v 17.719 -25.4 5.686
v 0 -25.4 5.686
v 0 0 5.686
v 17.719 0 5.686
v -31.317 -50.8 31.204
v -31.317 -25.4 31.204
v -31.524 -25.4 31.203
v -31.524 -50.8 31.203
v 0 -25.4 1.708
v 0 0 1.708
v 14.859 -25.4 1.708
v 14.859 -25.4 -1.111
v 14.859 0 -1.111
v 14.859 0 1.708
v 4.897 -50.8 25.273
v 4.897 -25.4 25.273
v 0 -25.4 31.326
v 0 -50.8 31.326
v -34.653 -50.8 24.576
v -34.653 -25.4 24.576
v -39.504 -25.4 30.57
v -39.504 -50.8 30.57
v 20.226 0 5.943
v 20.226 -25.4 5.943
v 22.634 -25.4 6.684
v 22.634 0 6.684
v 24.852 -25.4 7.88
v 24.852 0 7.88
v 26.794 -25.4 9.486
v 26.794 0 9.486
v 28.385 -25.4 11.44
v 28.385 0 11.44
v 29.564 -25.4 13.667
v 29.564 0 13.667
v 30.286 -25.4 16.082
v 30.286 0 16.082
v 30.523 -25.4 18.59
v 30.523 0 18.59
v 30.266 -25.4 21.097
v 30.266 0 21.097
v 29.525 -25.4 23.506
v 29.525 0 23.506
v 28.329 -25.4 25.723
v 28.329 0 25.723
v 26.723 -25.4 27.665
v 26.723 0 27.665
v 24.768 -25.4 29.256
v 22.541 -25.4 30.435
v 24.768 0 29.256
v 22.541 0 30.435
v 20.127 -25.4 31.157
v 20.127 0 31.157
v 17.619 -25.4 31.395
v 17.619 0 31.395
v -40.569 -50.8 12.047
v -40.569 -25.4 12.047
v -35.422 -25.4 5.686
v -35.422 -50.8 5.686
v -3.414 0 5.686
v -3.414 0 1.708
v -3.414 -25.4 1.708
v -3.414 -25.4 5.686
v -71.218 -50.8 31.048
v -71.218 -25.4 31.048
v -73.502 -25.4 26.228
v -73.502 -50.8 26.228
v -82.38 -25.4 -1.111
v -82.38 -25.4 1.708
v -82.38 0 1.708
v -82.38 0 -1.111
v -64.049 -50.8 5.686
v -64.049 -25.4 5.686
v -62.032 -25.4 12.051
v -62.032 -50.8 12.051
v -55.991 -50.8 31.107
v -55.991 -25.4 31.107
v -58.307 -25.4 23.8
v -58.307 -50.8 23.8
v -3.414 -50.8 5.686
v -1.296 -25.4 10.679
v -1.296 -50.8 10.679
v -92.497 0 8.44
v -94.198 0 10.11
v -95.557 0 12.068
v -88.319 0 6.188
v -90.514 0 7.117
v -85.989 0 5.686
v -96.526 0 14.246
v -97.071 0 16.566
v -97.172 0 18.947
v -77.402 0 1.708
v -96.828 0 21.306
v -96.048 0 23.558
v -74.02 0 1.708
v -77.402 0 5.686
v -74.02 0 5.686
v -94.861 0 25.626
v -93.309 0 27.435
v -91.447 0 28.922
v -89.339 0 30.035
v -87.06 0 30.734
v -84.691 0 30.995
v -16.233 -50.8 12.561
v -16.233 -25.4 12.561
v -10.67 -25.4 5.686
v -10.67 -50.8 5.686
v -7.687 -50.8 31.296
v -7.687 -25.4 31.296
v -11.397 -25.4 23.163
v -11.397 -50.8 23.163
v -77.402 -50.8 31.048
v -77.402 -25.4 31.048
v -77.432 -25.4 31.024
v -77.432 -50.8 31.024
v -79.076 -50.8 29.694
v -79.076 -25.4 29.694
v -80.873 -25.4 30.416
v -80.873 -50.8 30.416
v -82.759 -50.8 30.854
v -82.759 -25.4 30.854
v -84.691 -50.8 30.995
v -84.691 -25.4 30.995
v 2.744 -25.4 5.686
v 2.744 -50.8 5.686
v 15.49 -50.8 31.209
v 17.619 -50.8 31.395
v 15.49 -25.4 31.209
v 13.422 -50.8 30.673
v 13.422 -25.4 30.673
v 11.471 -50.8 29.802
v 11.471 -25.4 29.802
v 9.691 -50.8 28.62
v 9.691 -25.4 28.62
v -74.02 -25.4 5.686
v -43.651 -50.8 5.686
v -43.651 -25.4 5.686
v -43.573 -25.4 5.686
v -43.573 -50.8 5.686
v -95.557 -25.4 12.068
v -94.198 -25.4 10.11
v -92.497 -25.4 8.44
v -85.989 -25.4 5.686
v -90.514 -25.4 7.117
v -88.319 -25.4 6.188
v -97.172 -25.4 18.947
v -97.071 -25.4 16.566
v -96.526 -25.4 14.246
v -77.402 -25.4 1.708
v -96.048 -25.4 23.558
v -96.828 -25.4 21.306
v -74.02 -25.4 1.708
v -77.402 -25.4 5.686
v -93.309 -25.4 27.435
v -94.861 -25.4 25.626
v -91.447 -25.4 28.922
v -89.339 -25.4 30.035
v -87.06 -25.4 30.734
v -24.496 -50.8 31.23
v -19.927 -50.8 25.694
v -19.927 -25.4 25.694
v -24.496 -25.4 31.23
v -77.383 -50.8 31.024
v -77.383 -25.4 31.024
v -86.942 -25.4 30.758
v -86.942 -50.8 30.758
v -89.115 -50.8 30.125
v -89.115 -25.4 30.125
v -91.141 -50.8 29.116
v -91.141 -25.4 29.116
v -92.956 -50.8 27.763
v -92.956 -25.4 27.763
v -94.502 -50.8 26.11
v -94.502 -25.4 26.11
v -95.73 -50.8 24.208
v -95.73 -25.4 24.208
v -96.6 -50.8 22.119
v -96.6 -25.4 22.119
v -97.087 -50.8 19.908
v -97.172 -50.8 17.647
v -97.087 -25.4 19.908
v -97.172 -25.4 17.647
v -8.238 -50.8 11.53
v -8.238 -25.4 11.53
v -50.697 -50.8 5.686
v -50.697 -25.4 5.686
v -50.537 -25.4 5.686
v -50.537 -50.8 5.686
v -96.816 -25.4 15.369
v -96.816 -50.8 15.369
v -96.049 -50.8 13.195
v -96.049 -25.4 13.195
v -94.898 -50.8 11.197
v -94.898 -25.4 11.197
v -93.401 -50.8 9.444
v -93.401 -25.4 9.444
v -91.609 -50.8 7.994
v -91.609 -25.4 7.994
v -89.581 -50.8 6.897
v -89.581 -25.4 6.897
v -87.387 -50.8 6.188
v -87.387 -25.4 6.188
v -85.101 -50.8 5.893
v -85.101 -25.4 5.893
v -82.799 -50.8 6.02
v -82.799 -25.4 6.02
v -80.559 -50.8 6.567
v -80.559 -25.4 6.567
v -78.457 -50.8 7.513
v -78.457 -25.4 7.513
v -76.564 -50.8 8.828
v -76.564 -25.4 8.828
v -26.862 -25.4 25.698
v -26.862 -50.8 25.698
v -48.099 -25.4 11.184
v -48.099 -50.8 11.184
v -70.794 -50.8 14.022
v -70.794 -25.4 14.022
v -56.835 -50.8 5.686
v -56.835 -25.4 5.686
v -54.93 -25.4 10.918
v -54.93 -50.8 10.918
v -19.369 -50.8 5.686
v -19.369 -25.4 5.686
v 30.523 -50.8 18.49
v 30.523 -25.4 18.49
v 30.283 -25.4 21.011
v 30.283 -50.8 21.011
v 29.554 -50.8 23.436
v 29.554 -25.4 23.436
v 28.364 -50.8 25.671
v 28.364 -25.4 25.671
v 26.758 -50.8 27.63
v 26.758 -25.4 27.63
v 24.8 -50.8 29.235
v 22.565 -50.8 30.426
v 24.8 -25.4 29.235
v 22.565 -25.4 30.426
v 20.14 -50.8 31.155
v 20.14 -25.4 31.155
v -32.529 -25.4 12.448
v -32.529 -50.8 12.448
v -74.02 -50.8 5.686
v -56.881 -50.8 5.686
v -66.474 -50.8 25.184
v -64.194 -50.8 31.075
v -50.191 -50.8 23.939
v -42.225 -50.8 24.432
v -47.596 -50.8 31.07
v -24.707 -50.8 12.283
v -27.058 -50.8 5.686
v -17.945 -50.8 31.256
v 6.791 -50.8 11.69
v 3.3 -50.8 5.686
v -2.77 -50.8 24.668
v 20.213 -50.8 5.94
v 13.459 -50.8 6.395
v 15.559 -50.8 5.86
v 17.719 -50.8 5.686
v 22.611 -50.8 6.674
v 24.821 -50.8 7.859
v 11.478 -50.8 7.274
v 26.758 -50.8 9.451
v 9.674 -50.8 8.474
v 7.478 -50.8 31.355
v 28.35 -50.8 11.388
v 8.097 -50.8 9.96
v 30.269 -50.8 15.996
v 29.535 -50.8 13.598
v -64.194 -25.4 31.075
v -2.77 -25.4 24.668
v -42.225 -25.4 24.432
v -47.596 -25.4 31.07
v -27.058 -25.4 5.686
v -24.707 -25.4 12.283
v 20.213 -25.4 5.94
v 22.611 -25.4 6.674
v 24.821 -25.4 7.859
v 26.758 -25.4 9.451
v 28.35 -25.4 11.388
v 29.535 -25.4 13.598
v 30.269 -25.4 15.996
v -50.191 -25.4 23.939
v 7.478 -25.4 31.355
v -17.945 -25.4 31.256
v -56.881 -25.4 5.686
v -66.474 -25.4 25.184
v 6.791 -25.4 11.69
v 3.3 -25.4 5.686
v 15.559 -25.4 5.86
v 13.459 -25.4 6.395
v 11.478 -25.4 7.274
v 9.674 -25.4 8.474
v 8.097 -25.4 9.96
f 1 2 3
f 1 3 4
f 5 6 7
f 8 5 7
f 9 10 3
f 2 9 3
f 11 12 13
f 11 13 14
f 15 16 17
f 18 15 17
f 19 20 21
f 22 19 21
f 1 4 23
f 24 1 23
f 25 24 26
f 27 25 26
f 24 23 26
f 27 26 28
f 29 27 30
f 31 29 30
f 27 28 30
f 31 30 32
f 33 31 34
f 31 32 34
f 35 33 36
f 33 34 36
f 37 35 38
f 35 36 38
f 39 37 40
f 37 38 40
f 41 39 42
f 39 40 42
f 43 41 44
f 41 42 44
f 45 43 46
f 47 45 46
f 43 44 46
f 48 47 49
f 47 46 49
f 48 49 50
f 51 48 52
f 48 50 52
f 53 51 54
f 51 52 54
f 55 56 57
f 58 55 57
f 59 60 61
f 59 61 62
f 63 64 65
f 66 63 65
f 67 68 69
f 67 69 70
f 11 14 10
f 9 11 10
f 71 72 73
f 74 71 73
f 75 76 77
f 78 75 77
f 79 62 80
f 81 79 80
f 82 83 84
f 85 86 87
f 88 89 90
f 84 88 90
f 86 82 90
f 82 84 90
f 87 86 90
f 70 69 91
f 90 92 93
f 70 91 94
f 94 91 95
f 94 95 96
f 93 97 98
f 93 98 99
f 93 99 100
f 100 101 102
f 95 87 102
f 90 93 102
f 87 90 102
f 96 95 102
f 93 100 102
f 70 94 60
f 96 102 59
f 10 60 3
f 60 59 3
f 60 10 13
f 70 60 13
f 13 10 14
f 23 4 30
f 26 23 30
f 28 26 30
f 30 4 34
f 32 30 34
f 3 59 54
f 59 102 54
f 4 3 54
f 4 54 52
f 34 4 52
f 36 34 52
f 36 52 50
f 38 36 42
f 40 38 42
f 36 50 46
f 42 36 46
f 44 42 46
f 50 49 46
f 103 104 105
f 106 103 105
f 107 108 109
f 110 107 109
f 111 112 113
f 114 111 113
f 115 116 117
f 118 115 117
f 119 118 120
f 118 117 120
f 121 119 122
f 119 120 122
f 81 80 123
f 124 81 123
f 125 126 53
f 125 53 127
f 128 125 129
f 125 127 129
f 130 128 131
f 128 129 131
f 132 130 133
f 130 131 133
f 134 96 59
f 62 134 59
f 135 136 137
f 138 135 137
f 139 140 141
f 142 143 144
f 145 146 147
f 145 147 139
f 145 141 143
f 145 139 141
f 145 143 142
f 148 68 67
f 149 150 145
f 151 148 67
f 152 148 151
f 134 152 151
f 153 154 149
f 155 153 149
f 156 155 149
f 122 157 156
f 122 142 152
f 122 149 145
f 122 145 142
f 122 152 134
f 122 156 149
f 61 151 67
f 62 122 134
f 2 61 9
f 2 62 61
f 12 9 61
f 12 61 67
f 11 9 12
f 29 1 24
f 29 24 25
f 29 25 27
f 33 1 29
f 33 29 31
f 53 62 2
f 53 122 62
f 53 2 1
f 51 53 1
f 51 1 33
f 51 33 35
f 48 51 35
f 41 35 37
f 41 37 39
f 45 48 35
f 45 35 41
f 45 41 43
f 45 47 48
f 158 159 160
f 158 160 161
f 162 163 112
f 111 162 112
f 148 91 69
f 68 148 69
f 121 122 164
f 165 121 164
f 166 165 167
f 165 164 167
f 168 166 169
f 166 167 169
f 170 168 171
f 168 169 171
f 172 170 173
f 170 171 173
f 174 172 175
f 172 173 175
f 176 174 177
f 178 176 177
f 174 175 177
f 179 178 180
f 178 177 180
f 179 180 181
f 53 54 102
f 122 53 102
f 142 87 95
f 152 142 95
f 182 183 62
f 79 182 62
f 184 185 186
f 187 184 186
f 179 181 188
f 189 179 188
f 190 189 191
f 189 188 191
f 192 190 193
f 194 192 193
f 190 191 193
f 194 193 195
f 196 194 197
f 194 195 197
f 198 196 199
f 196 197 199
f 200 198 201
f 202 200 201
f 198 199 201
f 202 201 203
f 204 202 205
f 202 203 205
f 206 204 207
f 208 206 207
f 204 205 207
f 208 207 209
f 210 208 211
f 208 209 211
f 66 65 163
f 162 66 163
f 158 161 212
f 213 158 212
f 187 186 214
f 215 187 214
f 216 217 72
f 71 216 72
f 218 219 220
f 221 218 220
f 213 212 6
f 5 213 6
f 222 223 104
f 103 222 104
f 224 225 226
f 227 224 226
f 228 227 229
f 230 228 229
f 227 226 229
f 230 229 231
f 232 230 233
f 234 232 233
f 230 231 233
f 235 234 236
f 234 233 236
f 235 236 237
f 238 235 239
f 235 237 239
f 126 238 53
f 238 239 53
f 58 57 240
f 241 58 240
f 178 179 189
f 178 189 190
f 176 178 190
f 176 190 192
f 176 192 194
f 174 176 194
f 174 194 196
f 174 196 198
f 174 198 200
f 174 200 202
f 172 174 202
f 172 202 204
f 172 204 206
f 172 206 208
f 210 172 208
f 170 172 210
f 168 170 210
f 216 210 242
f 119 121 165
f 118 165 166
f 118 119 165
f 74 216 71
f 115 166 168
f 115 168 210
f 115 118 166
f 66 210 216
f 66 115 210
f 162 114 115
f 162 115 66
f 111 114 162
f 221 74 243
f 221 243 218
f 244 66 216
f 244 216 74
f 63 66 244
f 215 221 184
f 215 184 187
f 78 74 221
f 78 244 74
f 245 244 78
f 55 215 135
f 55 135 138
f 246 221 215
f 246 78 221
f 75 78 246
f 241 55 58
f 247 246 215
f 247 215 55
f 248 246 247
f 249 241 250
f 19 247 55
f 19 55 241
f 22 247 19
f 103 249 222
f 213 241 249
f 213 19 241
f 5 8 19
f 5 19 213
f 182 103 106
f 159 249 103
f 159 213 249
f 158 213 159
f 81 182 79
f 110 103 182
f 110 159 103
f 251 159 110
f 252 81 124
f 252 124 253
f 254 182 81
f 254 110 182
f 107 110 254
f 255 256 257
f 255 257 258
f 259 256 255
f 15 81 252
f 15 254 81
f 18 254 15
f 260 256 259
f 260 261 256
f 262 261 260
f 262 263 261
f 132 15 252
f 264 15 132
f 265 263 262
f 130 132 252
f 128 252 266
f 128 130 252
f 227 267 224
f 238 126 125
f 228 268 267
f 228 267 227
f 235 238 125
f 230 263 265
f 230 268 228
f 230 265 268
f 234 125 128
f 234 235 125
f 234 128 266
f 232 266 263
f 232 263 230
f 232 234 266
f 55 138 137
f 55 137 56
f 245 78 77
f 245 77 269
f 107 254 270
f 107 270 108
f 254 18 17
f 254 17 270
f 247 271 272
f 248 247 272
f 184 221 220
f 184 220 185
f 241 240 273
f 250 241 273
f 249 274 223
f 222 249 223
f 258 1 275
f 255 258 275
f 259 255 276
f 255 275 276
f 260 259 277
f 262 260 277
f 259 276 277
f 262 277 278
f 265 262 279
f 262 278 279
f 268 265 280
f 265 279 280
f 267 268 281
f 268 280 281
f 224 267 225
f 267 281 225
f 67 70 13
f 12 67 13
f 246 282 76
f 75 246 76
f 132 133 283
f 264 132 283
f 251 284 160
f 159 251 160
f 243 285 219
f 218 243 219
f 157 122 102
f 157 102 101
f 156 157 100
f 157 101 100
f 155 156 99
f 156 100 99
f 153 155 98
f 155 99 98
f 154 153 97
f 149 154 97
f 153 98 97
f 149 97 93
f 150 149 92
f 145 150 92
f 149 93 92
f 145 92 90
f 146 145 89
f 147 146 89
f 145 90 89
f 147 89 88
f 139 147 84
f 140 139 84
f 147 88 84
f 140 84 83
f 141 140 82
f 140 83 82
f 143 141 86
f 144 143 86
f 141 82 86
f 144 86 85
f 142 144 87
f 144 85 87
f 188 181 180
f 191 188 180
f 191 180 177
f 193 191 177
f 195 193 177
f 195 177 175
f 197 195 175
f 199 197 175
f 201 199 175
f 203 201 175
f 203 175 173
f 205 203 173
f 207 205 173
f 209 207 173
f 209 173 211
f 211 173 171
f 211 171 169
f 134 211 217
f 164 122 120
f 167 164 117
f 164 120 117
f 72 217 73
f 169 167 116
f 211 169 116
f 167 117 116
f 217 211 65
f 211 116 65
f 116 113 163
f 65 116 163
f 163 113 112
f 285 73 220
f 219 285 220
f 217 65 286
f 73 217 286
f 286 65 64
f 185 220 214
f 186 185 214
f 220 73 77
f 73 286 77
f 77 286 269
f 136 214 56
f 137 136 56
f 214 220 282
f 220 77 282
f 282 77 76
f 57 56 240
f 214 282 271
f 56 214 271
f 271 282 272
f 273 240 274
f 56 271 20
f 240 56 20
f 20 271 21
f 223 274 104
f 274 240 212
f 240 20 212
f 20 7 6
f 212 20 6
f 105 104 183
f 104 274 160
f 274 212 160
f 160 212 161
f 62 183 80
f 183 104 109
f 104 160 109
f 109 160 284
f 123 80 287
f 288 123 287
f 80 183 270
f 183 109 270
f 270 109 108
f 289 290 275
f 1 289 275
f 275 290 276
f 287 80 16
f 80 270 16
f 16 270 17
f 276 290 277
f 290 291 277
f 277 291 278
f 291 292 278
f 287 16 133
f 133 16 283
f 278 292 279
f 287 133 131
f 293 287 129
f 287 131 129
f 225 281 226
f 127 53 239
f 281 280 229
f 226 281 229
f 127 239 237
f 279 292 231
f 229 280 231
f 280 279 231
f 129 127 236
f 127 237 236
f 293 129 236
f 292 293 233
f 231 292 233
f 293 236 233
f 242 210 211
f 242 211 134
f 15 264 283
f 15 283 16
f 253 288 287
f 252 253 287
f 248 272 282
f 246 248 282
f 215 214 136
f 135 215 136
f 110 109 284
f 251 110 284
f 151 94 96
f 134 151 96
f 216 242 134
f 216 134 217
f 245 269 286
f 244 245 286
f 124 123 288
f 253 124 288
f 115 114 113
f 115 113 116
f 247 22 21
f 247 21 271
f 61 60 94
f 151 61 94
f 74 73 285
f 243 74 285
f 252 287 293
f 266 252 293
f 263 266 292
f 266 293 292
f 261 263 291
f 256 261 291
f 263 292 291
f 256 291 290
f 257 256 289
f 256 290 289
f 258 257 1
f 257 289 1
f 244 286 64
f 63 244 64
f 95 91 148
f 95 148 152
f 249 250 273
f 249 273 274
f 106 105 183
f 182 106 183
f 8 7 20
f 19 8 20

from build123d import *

# Parameters (mm, degrees)
F0_W     = 3.3822506666
F0_H     = 3.9780900193
F0_W_2   = 3.41430353
F1_DEPTH = 25.4
F3_DEPTH = 25.4


with BuildPart() as f1:
    # F0 (on Front) → F1 (new body)
    with BuildSketch(Plane.XZ):
        with BuildLine():
            Line((17.6185293709, 31.3945586435), (-84.690925819, 30.9954284879))
            ThreePointArc((-84.690925819, 30.9954284879), (-97.1724884118, 18.9474547222), (-85.9888429003, 5.6858880844))
            Line((-85.9888429003, 5.6858880844), (-77.4023757015, 5.6858880844))
            Line((-77.4023757015, 5.6858880844), (-74.0201250348, 5.6858880844))
            Line((-74.0201250348, 5.6858880844), (-3.41430353, 5.6858880844))
            Line((-3.41430353, 5.6858880844), (0, 5.6858880844))
            Line((0, 5.6858880844), (17.7188241644, 5.6858880844))
            ThreePointArc((17.7188241644, 5.6858880844), (30.5230120472, 18.5903707607), (17.6185293709, 31.3945586435))
        make_face()
        Polygon((-74.0201250348, 1.7077980651), (-77.4023757015, 1.7077980651), (-82.3802331347, 1.7077980651), (-82.3802331347, -1.1107394616), (14.8593058926, -1.1107394616), (14.8593058926, 1.7077980651), (0, 1.7077980651), (-3.41430353, 1.7077980651), align=None)
        with Locations((-75.7112503681, 3.6968430748)):
            Rectangle(F0_W, F0_H)
        with Locations((-1.707151765, 3.6968430748)):
            Rectangle(F0_W_2, F0_H)
    extrude(amount=F1_DEPTH)


with BuildPart() as f3:
    # F2 (on face) → F3 (new body)
    with BuildSketch(Plane.XZ.offset(25.4)):
        with BuildLine():
            Line((7.4777157191, 31.3549972508), (4.8971420417, 25.2733859425))
            Line((4.8971420417, 25.2733859425), (5.9934429038, 23.9184539713))
            ThreePointArc((5.9934429038, 23.9184539713), (7.5649987966, 26.4870555439), (9.6910032973, 28.6195674022))
            Line((9.6910032973, 28.6195674022), (7.4777157191, 31.3549972508))
        make_face()
        with BuildLine():
            Line((-70.7939430509, 14.0216318164), (-72.3393960707, 15.9316765669))
            ThreePointArc((-72.3393960707, 15.9316765669), (-73.8502646914, 12.0224570054), (-76.5635452821, 8.8282700972))
            Line((-76.5635452821, 8.8282700972), (-74.0201250348, 5.6858880844))
            Line((-74.0201250348, 5.6858880844), (-70.7939430509, 14.0216318164))
        make_face()
        Polygon((-71.2180261518, 31.0479890311), (-73.502197242, 26.227709607), (-68.4746691883, 20.0141246946), (-66.473640178, 25.1843429628), align=None)
        Polygon((-64.1936278631, 31.0753926486), (-66.473640178, 25.1843429628), (-60.2907627098, 17.5428472334), (-58.3071993355, 23.8002818794), align=None)
        Polygon((-66.473640178, 25.1843429628), (-68.4746691883, 20.0141246946), (-62.0316164015, 12.0510750292), (-60.2907627098, 17.5428472334), align=None)
        Polygon((-58.3071993355, 23.8002818794), (-60.2907627098, 17.5428472334), (-54.9303545076, 10.9178515748), (-52.7441106652, 16.9247908908), align=None)
        Polygon((-55.990895741, 31.107393188), (-58.3071993355, 23.8002818794), (-52.7441106652, 16.9247908908), (-50.1911272132, 23.9393865981), align=None)
        Polygon((-50.1911272132, 23.9393865981), (-52.7441106652, 16.9247908908), (-48.0993479846, 11.1842704987), (-45.186380638, 17.7539576005), align=None)
        Polygon((-47.596065493, 31.0695968577), (-50.1911272132, 23.9393865981), (-45.186380638, 17.7539576005), (-42.2254017695, 24.4319262718), align=None)
        Polygon((-42.2254017695, 24.4319262718), (-45.186380638, 17.7539576005), (-40.5691399293, 12.0474519584), (-37.4866464693, 18.5752392237), align=None)
        Polygon((-37.4866464693, 18.5752392237), (-40.5691399293, 12.0474519584), (-35.4218793232, 5.6858880844), (-32.5293636679, 12.4484712987), align=None)
        Polygon((-39.5036414146, 30.5703795293), (-42.2254017695, 24.4319262718), (-37.4866464693, 18.5752392237), (-34.6531887292, 24.5756442832), align=None)
        Polygon((-34.6531887292, 24.5756442832), (-37.4866464693, 18.5752392237), (-32.5293636679, 12.4484712987), (-29.8705353594, 18.6647030608), align=None)
        Polygon((-27.0576307947, 5.6858880844), (-24.7067181319, 12.2826766509), (-29.8705353594, 18.6647030608), (-32.5293636679, 12.4484712987), align=None)
        Polygon((-24.7067181319, 12.2826766509), (-22.0467696405, 19.7466365302), (-26.8621946159, 25.6980805906), (-29.8705353594, 18.6647030608), align=None)
        Polygon((-22.0467696405, 19.7466365302), (-19.9271756152, 25.6943324413), (-24.4959509544, 31.2302614233), (-26.8621946159, 25.6980805906), align=None)
        Polygon((-16.2328725231, 12.5611682395), (-13.6896492255, 18.1363983006), (-19.9271756152, 25.6943324413), (-22.0467696405, 19.7466365302), align=None)
        Polygon((-10.6699544422, 5.6858880844), (-8.2377734431, 11.5304273544), (-13.6896492255, 18.1363983006), (-16.2328725231, 12.5611682395), align=None)
        Polygon((-19.9271756152, 25.6943324413), (-13.6896492255, 18.1363983006), (-11.3968622992, 23.1626241166), (-17.9452165503, 31.2558171809), align=None)
        Polygon((-13.6896492255, 18.1363983006), (-8.2377734431, 11.5304273544), (-6.1141082191, 16.6336021603), (-11.3968622992, 23.1626241166), align=None)
        Polygon((-8.2377734431, 11.5304273544), (-3.41430353, 5.6858880844), (-1.2957857458, 10.678577046), (-6.1141082191, 16.6336021603), align=None)
        Polygon((-11.3968622992, 23.1626241166), (-6.1141082191, 16.6336021603), (-2.7704892434, 24.6683300094), (-7.6867772585, 31.2958374553), align=None)
        Polygon((-2.7704892434, 24.6683300094), (1.9437611458, 18.3131837161), (4.8971420417, 25.2733859425), (0, 31.325825149), align=None)
        Polygon((-68.4746691883, 20.0141246946), (-70.7939430509, 14.0216318164), (-64.049336507, 5.6858880844), (-62.0316164015, 12.0510750292), align=None)
        with BuildLine():
            ThreePointArc((-74.0201250348, 25.134728134), (-72.2906003999, 20.6955873172), (-72.3393960707, 15.9316765669))
            Line((-72.3393960707, 15.9316765669), (-70.7939430509, 14.0216318164))
            Line((-70.7939430509, 14.0216318164), (-68.4746691883, 20.0141246946))
            Line((-68.4746691883, 20.0141246946), (-73.502197242, 26.227709607))
            Line((-73.502197242, 26.227709607), (-74.0201250348, 25.134728134))
        make_face()
        Polygon((-77.4023757015, 31.0479890311), (-77.4323383065, 31.0237457256), (-77.3829159918, 31.0239385322), align=None)
        with BuildLine():
            Line((4.8971420417, 25.2733859425), (1.9437611458, 18.3131837161))
            Line((1.9437611458, 18.3131837161), (6.5135129633, 12.1528318198))
            ThreePointArc((6.5135129633, 12.1528318198), (6.6500466739, 11.9200843098), (6.7914358382, 11.6902540208))
            ThreePointArc((6.7914358382, 11.6902540208), (11.4783947736, 7.2744850804), (17.7188241644, 5.6858880844))
            ThreePointArc((17.7188241644, 5.6858880844), (26.7581335787, 9.4507665529), (30.5230120472, 18.4900759672))
            ThreePointArc((30.5230120472, 18.4900759672), (26.7581335787, 27.629680175), (17.6185293709, 31.3945586435))
            ThreePointArc((17.6185293709, 31.3945586435), (13.4217224395, 30.6728170345), (9.6910032973, 28.6195674022))
            ThreePointArc((9.6910032973, 28.6195674022), (7.5649987966, 26.4870555439), (5.9934429038, 23.9184539713))
            Line((5.9934429038, 23.9184539713), (4.8971420417, 25.2733859425))
        make_face()
        with BuildLine():
            ThreePointArc((-79.0755543994, 29.6941887755), (-76.2329194186, 27.7636351337), (-74.0201250348, 25.134728134))
            Line((-74.0201250348, 25.134728134), (-73.502197242, 26.227709607))
            Line((-73.502197242, 26.227709607), (-77.3829159918, 31.0239385322))
            Line((-77.3829159918, 31.0239385322), (-77.4323383065, 31.0237457256))
            Line((-77.4323383065, 31.0237457256), (-79.0755543994, 29.6941887755))
        make_face()
        with BuildLine():
            ThreePointArc((-76.5635452821, 8.8282700972), (-73.8502646914, 12.0224570054), (-72.3393960707, 15.9316765669))
            ThreePointArc((-72.3393960707, 15.9316765669), (-72.2906003999, 20.6955873172), (-74.0201250348, 25.134728134))
            ThreePointArc((-74.0201250348, 25.134728134), (-76.2329194186, 27.7636351337), (-79.0755543994, 29.6941887755))
            ThreePointArc((-79.0755543994, 29.6941887755), (-81.8075563521, 30.6714144079), (-84.690925819, 30.9954284879))
            ThreePointArc((-84.690925819, 30.9954284879), (-93.7656968448, 26.9708868998), (-97.1724884118, 17.6466080867))
            ThreePointArc((-97.1724884118, 17.6466080867), (-89.5811921329, 6.8965985351), (-76.5635452821, 8.8282700972))
        make_face()
        Polygon((-60.2907627098, 17.5428472334), (-62.0316164015, 12.0510750292), (-56.8814243009, 5.6858880844), (-56.83454354, 5.6858880844), (-54.9303545076, 10.9178515748), align=None)
        Polygon((-52.7441106652, 16.9247908908), (-54.9303545076, 10.9178515748), (-50.6970747512, 5.6858880844), (-50.537304037, 5.6858880844), (-48.0993479846, 11.1842704987), align=None)
        Polygon((-45.186380638, 17.7539576005), (-48.0993479846, 11.1842704987), (-43.6505036817, 5.6858880844), (-43.5731408625, 5.6858880844), (-40.5691399293, 12.0474519584), align=None)
        with BuildLine():
            Line((1.9437611458, 18.3131837161), (-1.2957857458, 10.678577046))
            Line((-1.2957857458, 10.678577046), (2.743892503, 5.6858880844))
            Line((2.743892503, 5.6858880844), (3.2997857527, 5.6858880844))
            Line((3.2997857527, 5.6858880844), (6.7914358382, 11.6902540208))
            ThreePointArc((6.7914358382, 11.6902540208), (6.6500466739, 11.9200843098), (6.5135129633, 12.1528318198))
            Line((6.5135129633, 12.1528318198), (1.9437611458, 18.3131837161))
        make_face()
        Polygon((-6.1141082191, 16.6336021603), (-1.2957857458, 10.678577046), (1.9437611458, 18.3131837161), (-2.7704892434, 24.6683300094), align=None)
        Polygon((-19.3691328168, 5.6858880844), (-16.2328725231, 12.5611682395), (-22.0467696405, 19.7466365302), (-24.7067181319, 12.2826766509), align=None)
        Polygon((-29.8705353594, 18.6647030608), (-26.8621946159, 25.6980805906), (-31.3168554081, 31.2036516769), (-31.5237513565, 31.2028445334), (-34.6531887292, 24.5756442832), align=None)
    extrude(amount=F3_DEPTH)


solid = Compound([f1.part, f3.part])
